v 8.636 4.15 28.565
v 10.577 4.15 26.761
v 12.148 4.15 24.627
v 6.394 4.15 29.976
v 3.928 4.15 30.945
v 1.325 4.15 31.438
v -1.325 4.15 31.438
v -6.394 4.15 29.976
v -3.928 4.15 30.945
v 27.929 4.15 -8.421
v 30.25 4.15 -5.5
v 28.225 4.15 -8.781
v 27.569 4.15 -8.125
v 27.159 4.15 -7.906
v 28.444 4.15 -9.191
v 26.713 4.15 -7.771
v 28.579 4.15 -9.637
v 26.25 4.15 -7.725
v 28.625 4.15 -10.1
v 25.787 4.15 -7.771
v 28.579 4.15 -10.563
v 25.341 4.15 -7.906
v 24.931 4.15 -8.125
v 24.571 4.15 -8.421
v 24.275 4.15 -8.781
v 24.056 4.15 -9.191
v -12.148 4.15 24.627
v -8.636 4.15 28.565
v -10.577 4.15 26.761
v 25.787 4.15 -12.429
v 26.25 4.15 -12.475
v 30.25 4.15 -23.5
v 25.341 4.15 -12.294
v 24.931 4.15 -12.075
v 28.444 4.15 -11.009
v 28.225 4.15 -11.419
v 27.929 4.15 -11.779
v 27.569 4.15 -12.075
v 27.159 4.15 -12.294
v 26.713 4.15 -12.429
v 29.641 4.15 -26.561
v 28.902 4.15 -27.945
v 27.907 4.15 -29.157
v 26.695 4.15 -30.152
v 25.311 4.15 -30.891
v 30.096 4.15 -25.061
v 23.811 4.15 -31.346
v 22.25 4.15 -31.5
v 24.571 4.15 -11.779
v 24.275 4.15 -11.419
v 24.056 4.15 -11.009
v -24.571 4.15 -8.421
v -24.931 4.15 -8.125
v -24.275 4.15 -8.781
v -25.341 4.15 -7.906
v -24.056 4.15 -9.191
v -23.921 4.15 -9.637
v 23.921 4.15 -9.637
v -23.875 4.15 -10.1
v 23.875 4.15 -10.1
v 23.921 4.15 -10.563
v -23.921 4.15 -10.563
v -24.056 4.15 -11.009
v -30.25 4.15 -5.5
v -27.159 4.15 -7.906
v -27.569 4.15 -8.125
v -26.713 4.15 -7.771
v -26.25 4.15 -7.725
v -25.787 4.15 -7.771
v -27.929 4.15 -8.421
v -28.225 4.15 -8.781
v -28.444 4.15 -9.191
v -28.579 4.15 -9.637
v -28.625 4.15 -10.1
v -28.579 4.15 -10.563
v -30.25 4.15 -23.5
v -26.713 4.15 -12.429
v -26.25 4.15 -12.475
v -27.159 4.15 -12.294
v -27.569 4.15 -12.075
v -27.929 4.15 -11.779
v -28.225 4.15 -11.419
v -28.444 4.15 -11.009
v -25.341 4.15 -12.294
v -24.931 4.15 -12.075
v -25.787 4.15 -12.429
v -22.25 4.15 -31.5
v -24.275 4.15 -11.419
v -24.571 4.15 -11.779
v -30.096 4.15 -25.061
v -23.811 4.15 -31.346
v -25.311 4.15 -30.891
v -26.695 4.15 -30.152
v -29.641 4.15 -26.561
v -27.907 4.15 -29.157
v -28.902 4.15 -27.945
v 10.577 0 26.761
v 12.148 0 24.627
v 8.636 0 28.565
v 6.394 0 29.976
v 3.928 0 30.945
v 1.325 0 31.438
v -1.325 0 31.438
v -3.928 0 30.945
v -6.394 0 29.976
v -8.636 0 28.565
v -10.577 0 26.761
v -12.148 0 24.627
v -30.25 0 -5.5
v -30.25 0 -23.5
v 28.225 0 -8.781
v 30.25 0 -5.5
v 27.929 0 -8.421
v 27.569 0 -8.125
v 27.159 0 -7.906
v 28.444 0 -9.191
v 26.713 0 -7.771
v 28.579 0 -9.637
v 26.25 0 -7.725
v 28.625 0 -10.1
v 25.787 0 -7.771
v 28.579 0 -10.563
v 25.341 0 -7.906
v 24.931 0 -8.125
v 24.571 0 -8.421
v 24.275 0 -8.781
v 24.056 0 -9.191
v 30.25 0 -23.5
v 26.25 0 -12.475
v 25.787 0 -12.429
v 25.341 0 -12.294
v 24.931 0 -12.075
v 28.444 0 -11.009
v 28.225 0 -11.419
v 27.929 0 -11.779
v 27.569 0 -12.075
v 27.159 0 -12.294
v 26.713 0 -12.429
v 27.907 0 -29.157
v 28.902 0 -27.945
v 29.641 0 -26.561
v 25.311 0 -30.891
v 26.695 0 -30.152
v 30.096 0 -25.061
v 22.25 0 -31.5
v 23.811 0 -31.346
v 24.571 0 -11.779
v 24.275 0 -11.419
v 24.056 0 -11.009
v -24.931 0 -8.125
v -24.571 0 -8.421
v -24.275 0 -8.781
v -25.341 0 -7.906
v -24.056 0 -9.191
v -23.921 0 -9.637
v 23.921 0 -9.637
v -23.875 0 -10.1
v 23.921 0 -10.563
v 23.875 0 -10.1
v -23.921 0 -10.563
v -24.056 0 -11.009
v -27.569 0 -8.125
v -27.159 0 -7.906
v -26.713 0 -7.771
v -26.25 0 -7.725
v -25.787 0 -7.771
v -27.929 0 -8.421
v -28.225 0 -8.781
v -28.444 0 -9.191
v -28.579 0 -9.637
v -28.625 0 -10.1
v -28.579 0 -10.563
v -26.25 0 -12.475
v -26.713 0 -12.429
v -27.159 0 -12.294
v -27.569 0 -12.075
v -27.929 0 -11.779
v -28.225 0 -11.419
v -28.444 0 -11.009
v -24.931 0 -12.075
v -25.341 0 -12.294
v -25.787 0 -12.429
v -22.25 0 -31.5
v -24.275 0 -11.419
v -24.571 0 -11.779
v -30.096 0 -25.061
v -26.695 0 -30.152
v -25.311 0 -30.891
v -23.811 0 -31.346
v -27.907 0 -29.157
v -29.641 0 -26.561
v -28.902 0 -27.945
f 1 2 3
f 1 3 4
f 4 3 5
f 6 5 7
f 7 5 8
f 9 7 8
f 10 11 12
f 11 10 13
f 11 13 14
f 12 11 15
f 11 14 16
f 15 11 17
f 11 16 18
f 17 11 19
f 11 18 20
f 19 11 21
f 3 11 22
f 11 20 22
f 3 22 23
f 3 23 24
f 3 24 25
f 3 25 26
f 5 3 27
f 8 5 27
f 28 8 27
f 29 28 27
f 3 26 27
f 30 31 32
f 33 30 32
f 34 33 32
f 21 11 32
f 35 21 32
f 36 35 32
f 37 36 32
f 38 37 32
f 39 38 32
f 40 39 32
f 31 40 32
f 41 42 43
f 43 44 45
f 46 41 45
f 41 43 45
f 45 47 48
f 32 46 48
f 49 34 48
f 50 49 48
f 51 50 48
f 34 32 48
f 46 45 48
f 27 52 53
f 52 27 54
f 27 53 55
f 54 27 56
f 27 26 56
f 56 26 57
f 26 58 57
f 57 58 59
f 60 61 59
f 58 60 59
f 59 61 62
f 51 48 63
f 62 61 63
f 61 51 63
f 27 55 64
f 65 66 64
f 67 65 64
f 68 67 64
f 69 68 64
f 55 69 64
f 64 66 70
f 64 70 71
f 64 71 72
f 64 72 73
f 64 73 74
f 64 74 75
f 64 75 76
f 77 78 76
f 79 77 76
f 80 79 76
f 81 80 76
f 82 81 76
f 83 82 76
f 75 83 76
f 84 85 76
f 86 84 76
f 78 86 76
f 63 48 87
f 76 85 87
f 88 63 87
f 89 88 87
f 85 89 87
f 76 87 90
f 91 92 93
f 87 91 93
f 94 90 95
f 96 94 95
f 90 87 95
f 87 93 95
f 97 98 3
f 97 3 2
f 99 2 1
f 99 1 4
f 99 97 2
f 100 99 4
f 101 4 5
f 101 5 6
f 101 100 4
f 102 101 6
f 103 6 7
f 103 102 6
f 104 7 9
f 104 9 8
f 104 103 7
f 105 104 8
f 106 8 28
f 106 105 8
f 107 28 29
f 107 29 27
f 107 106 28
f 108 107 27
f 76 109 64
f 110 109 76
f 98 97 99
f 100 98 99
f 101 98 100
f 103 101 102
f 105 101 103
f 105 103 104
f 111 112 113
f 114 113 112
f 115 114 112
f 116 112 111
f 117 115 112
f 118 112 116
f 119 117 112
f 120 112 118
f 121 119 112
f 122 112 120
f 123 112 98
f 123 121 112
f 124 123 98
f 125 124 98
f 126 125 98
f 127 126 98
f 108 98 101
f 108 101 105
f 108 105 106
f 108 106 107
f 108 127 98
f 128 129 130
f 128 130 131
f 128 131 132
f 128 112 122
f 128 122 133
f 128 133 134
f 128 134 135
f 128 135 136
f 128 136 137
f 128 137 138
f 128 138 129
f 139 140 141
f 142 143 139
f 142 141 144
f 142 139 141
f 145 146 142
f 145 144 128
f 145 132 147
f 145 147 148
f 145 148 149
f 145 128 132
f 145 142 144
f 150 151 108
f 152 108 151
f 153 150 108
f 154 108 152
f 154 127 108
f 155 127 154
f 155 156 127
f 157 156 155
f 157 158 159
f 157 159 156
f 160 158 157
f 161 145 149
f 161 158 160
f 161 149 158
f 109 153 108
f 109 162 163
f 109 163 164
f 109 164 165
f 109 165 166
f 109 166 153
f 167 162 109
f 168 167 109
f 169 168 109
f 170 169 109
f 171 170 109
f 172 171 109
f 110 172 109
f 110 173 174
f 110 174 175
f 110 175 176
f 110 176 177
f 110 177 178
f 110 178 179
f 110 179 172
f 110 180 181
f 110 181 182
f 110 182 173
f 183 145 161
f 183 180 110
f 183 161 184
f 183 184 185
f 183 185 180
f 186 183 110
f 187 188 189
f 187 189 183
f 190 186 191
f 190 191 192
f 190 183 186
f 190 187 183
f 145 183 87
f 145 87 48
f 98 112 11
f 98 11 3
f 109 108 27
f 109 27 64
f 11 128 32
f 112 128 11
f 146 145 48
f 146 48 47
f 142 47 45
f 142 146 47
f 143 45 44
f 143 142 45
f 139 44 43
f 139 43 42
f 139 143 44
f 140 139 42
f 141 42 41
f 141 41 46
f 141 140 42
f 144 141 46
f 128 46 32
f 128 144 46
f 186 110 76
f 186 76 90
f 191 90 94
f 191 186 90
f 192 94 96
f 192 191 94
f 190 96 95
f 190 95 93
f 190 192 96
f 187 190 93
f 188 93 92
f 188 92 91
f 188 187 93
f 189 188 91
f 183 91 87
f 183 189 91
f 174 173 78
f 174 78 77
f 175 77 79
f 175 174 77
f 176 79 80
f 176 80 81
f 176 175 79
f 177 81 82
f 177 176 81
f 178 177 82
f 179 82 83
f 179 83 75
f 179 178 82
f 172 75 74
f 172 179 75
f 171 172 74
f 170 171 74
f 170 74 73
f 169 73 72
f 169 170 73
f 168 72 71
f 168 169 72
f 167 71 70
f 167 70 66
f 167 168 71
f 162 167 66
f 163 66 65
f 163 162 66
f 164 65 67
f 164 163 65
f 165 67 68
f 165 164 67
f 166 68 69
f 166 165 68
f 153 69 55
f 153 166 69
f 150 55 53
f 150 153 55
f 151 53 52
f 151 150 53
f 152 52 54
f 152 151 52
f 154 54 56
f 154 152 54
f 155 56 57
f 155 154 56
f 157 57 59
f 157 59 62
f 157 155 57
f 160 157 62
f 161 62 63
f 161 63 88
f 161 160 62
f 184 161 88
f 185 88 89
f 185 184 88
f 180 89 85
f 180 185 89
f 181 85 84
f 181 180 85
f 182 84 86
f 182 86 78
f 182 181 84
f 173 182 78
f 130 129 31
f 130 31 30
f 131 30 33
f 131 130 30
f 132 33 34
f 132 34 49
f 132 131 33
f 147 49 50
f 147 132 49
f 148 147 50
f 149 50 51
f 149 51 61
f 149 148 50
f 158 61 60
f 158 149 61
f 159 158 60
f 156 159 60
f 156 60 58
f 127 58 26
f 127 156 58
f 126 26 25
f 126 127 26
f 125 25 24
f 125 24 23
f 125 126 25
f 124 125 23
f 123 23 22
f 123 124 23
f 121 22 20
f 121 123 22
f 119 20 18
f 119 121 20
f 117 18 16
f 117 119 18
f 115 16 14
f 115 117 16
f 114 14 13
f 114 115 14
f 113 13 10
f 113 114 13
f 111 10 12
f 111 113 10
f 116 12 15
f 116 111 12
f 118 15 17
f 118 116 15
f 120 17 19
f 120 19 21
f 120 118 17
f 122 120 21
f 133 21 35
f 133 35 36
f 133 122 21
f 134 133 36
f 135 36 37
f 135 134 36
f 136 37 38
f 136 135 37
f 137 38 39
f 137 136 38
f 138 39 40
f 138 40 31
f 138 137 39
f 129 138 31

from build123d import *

# Parameters (mm, degrees)
SKETCH1_R           = 2.375
BOSS_EXTRUDE1_DEPTH = 4.15


with BuildPart() as part:
    # Sketch1 → Boss-Extrude1 (new body)
    with BuildSketch(Plane(origin=(0, 0, 0), x_dir=(1, 0, 0), z_dir=(0, 1, 0))):
        with BuildLine():
            Line((-22.25, 31.5), (22.25, 31.5))
            ThreePointArc((22.25, 31.5), (27.906854249, 29.156854249), (30.25, 23.5))
            Line((30.25, 23.5), (30.25, 5.5))
            Line((30.25, 5.5), (12.147813291, -24.627097925))
            ThreePointArc((12.147813291, -24.627097925), (0, -31.5), (-12.147813291, -24.627097925))
            Line((-12.147813291, -24.627097925), (-30.25, 5.5))
            Line((-30.25, 5.5), (-30.25, 23.5))
            ThreePointArc((-30.25, 23.5), (-27.906854249, 29.156854249), (-22.25, 31.5))
        make_face()
        with Locations(Location((26.25, 10.1, 0), (0, 0, 90))):
            Circle(SKETCH1_R, mode=Mode.SUBTRACT)
        with Locations(Location((-26.25, 10.1, 0), (0, 0, 90))):
            Circle(SKETCH1_R, mode=Mode.SUBTRACT)
    extrude(amount=BOSS_EXTRUDE1_DEPTH)


solid = part.part
